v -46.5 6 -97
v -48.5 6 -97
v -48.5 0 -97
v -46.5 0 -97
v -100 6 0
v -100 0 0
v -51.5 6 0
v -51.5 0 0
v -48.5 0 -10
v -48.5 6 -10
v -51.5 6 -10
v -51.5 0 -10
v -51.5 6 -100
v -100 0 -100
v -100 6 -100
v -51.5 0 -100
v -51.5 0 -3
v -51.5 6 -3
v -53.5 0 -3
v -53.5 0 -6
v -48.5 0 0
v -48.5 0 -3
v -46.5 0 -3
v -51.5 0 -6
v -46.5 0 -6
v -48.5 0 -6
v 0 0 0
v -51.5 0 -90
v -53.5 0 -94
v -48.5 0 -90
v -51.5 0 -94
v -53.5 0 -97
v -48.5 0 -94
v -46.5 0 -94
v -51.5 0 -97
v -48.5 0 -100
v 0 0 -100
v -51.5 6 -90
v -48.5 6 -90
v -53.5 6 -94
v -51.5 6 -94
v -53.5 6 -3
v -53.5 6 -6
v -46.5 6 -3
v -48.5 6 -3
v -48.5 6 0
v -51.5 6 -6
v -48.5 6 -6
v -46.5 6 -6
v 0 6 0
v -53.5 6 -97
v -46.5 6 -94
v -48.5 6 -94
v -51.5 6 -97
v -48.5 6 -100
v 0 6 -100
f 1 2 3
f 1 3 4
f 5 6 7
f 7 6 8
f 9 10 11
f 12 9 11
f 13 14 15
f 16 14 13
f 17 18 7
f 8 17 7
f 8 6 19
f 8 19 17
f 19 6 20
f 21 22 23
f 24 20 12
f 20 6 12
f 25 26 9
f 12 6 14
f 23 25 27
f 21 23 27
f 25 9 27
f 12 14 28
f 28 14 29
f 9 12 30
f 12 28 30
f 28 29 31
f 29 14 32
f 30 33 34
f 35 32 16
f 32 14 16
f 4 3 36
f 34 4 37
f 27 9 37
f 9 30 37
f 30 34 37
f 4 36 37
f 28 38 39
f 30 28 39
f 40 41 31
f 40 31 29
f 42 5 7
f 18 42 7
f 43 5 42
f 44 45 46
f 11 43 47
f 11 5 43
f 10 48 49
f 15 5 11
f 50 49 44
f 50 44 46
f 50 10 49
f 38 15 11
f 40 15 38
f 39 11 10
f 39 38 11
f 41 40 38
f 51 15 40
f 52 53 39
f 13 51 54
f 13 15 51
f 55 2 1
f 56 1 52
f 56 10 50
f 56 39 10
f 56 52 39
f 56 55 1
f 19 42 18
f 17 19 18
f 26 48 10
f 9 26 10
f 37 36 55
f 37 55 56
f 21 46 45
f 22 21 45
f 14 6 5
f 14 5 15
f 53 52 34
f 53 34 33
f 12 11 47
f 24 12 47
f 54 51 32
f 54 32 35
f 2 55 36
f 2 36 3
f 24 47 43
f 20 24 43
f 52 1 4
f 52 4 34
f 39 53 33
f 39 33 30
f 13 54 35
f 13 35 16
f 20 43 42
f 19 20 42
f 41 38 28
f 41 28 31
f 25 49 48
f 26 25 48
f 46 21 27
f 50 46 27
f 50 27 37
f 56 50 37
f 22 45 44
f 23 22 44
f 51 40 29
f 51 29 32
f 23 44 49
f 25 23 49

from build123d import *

# Parameters (mm, degrees)
SKETCH2_W           = 100
SKETCH2_H           = 100
BOSS_EXTRUDE1_DEPTH = 6
CUT_EXTRUDE1_DEPTH  = 7


with BuildPart() as part:
    # Sketch2 → Boss-Extrude1 (new body)
    with BuildSketch(Plane(origin=(0, 0, 0), x_dir=(1, 0, 0), z_dir=(0, 1, 0))):
        with Locations((-50, 50)):
            Rectangle(SKETCH2_W, SKETCH2_H)
    extrude(amount=BOSS_EXTRUDE1_DEPTH)

    # Sketch3 → Cut-Extrude1 (cut, through all)
    with BuildSketch(Plane(origin=(0, 6, 0), x_dir=(1, 0, 0), z_dir=(0, 1, 0))):
        Polygon((-50, 100), (-48.5, 100), (-48.5, 97), (-46.5, 97), (-46.5, 94), (-48.5, 94), (-48.5, 90), (-50, 90), (-51.5, 90), (-51.5, 94), (-53.5, 94), (-53.5, 97), (-51.5, 97), (-51.5, 100), align=None)
        Polygon((-50, 0), (-48.5, 0), (-48.5, 3), (-46.5, 3), (-46.5, 6), (-48.5, 6), (-48.5, 10), (-50, 10), (-51.5, 10), (-51.5, 6), (-53.5, 6), (-53.5, 3), (-51.5, 3), (-51.5, 0), align=None)
    extrude(amount=-CUT_EXTRUDE1_DEPTH, mode=Mode.SUBTRACT)


solid = part.part
